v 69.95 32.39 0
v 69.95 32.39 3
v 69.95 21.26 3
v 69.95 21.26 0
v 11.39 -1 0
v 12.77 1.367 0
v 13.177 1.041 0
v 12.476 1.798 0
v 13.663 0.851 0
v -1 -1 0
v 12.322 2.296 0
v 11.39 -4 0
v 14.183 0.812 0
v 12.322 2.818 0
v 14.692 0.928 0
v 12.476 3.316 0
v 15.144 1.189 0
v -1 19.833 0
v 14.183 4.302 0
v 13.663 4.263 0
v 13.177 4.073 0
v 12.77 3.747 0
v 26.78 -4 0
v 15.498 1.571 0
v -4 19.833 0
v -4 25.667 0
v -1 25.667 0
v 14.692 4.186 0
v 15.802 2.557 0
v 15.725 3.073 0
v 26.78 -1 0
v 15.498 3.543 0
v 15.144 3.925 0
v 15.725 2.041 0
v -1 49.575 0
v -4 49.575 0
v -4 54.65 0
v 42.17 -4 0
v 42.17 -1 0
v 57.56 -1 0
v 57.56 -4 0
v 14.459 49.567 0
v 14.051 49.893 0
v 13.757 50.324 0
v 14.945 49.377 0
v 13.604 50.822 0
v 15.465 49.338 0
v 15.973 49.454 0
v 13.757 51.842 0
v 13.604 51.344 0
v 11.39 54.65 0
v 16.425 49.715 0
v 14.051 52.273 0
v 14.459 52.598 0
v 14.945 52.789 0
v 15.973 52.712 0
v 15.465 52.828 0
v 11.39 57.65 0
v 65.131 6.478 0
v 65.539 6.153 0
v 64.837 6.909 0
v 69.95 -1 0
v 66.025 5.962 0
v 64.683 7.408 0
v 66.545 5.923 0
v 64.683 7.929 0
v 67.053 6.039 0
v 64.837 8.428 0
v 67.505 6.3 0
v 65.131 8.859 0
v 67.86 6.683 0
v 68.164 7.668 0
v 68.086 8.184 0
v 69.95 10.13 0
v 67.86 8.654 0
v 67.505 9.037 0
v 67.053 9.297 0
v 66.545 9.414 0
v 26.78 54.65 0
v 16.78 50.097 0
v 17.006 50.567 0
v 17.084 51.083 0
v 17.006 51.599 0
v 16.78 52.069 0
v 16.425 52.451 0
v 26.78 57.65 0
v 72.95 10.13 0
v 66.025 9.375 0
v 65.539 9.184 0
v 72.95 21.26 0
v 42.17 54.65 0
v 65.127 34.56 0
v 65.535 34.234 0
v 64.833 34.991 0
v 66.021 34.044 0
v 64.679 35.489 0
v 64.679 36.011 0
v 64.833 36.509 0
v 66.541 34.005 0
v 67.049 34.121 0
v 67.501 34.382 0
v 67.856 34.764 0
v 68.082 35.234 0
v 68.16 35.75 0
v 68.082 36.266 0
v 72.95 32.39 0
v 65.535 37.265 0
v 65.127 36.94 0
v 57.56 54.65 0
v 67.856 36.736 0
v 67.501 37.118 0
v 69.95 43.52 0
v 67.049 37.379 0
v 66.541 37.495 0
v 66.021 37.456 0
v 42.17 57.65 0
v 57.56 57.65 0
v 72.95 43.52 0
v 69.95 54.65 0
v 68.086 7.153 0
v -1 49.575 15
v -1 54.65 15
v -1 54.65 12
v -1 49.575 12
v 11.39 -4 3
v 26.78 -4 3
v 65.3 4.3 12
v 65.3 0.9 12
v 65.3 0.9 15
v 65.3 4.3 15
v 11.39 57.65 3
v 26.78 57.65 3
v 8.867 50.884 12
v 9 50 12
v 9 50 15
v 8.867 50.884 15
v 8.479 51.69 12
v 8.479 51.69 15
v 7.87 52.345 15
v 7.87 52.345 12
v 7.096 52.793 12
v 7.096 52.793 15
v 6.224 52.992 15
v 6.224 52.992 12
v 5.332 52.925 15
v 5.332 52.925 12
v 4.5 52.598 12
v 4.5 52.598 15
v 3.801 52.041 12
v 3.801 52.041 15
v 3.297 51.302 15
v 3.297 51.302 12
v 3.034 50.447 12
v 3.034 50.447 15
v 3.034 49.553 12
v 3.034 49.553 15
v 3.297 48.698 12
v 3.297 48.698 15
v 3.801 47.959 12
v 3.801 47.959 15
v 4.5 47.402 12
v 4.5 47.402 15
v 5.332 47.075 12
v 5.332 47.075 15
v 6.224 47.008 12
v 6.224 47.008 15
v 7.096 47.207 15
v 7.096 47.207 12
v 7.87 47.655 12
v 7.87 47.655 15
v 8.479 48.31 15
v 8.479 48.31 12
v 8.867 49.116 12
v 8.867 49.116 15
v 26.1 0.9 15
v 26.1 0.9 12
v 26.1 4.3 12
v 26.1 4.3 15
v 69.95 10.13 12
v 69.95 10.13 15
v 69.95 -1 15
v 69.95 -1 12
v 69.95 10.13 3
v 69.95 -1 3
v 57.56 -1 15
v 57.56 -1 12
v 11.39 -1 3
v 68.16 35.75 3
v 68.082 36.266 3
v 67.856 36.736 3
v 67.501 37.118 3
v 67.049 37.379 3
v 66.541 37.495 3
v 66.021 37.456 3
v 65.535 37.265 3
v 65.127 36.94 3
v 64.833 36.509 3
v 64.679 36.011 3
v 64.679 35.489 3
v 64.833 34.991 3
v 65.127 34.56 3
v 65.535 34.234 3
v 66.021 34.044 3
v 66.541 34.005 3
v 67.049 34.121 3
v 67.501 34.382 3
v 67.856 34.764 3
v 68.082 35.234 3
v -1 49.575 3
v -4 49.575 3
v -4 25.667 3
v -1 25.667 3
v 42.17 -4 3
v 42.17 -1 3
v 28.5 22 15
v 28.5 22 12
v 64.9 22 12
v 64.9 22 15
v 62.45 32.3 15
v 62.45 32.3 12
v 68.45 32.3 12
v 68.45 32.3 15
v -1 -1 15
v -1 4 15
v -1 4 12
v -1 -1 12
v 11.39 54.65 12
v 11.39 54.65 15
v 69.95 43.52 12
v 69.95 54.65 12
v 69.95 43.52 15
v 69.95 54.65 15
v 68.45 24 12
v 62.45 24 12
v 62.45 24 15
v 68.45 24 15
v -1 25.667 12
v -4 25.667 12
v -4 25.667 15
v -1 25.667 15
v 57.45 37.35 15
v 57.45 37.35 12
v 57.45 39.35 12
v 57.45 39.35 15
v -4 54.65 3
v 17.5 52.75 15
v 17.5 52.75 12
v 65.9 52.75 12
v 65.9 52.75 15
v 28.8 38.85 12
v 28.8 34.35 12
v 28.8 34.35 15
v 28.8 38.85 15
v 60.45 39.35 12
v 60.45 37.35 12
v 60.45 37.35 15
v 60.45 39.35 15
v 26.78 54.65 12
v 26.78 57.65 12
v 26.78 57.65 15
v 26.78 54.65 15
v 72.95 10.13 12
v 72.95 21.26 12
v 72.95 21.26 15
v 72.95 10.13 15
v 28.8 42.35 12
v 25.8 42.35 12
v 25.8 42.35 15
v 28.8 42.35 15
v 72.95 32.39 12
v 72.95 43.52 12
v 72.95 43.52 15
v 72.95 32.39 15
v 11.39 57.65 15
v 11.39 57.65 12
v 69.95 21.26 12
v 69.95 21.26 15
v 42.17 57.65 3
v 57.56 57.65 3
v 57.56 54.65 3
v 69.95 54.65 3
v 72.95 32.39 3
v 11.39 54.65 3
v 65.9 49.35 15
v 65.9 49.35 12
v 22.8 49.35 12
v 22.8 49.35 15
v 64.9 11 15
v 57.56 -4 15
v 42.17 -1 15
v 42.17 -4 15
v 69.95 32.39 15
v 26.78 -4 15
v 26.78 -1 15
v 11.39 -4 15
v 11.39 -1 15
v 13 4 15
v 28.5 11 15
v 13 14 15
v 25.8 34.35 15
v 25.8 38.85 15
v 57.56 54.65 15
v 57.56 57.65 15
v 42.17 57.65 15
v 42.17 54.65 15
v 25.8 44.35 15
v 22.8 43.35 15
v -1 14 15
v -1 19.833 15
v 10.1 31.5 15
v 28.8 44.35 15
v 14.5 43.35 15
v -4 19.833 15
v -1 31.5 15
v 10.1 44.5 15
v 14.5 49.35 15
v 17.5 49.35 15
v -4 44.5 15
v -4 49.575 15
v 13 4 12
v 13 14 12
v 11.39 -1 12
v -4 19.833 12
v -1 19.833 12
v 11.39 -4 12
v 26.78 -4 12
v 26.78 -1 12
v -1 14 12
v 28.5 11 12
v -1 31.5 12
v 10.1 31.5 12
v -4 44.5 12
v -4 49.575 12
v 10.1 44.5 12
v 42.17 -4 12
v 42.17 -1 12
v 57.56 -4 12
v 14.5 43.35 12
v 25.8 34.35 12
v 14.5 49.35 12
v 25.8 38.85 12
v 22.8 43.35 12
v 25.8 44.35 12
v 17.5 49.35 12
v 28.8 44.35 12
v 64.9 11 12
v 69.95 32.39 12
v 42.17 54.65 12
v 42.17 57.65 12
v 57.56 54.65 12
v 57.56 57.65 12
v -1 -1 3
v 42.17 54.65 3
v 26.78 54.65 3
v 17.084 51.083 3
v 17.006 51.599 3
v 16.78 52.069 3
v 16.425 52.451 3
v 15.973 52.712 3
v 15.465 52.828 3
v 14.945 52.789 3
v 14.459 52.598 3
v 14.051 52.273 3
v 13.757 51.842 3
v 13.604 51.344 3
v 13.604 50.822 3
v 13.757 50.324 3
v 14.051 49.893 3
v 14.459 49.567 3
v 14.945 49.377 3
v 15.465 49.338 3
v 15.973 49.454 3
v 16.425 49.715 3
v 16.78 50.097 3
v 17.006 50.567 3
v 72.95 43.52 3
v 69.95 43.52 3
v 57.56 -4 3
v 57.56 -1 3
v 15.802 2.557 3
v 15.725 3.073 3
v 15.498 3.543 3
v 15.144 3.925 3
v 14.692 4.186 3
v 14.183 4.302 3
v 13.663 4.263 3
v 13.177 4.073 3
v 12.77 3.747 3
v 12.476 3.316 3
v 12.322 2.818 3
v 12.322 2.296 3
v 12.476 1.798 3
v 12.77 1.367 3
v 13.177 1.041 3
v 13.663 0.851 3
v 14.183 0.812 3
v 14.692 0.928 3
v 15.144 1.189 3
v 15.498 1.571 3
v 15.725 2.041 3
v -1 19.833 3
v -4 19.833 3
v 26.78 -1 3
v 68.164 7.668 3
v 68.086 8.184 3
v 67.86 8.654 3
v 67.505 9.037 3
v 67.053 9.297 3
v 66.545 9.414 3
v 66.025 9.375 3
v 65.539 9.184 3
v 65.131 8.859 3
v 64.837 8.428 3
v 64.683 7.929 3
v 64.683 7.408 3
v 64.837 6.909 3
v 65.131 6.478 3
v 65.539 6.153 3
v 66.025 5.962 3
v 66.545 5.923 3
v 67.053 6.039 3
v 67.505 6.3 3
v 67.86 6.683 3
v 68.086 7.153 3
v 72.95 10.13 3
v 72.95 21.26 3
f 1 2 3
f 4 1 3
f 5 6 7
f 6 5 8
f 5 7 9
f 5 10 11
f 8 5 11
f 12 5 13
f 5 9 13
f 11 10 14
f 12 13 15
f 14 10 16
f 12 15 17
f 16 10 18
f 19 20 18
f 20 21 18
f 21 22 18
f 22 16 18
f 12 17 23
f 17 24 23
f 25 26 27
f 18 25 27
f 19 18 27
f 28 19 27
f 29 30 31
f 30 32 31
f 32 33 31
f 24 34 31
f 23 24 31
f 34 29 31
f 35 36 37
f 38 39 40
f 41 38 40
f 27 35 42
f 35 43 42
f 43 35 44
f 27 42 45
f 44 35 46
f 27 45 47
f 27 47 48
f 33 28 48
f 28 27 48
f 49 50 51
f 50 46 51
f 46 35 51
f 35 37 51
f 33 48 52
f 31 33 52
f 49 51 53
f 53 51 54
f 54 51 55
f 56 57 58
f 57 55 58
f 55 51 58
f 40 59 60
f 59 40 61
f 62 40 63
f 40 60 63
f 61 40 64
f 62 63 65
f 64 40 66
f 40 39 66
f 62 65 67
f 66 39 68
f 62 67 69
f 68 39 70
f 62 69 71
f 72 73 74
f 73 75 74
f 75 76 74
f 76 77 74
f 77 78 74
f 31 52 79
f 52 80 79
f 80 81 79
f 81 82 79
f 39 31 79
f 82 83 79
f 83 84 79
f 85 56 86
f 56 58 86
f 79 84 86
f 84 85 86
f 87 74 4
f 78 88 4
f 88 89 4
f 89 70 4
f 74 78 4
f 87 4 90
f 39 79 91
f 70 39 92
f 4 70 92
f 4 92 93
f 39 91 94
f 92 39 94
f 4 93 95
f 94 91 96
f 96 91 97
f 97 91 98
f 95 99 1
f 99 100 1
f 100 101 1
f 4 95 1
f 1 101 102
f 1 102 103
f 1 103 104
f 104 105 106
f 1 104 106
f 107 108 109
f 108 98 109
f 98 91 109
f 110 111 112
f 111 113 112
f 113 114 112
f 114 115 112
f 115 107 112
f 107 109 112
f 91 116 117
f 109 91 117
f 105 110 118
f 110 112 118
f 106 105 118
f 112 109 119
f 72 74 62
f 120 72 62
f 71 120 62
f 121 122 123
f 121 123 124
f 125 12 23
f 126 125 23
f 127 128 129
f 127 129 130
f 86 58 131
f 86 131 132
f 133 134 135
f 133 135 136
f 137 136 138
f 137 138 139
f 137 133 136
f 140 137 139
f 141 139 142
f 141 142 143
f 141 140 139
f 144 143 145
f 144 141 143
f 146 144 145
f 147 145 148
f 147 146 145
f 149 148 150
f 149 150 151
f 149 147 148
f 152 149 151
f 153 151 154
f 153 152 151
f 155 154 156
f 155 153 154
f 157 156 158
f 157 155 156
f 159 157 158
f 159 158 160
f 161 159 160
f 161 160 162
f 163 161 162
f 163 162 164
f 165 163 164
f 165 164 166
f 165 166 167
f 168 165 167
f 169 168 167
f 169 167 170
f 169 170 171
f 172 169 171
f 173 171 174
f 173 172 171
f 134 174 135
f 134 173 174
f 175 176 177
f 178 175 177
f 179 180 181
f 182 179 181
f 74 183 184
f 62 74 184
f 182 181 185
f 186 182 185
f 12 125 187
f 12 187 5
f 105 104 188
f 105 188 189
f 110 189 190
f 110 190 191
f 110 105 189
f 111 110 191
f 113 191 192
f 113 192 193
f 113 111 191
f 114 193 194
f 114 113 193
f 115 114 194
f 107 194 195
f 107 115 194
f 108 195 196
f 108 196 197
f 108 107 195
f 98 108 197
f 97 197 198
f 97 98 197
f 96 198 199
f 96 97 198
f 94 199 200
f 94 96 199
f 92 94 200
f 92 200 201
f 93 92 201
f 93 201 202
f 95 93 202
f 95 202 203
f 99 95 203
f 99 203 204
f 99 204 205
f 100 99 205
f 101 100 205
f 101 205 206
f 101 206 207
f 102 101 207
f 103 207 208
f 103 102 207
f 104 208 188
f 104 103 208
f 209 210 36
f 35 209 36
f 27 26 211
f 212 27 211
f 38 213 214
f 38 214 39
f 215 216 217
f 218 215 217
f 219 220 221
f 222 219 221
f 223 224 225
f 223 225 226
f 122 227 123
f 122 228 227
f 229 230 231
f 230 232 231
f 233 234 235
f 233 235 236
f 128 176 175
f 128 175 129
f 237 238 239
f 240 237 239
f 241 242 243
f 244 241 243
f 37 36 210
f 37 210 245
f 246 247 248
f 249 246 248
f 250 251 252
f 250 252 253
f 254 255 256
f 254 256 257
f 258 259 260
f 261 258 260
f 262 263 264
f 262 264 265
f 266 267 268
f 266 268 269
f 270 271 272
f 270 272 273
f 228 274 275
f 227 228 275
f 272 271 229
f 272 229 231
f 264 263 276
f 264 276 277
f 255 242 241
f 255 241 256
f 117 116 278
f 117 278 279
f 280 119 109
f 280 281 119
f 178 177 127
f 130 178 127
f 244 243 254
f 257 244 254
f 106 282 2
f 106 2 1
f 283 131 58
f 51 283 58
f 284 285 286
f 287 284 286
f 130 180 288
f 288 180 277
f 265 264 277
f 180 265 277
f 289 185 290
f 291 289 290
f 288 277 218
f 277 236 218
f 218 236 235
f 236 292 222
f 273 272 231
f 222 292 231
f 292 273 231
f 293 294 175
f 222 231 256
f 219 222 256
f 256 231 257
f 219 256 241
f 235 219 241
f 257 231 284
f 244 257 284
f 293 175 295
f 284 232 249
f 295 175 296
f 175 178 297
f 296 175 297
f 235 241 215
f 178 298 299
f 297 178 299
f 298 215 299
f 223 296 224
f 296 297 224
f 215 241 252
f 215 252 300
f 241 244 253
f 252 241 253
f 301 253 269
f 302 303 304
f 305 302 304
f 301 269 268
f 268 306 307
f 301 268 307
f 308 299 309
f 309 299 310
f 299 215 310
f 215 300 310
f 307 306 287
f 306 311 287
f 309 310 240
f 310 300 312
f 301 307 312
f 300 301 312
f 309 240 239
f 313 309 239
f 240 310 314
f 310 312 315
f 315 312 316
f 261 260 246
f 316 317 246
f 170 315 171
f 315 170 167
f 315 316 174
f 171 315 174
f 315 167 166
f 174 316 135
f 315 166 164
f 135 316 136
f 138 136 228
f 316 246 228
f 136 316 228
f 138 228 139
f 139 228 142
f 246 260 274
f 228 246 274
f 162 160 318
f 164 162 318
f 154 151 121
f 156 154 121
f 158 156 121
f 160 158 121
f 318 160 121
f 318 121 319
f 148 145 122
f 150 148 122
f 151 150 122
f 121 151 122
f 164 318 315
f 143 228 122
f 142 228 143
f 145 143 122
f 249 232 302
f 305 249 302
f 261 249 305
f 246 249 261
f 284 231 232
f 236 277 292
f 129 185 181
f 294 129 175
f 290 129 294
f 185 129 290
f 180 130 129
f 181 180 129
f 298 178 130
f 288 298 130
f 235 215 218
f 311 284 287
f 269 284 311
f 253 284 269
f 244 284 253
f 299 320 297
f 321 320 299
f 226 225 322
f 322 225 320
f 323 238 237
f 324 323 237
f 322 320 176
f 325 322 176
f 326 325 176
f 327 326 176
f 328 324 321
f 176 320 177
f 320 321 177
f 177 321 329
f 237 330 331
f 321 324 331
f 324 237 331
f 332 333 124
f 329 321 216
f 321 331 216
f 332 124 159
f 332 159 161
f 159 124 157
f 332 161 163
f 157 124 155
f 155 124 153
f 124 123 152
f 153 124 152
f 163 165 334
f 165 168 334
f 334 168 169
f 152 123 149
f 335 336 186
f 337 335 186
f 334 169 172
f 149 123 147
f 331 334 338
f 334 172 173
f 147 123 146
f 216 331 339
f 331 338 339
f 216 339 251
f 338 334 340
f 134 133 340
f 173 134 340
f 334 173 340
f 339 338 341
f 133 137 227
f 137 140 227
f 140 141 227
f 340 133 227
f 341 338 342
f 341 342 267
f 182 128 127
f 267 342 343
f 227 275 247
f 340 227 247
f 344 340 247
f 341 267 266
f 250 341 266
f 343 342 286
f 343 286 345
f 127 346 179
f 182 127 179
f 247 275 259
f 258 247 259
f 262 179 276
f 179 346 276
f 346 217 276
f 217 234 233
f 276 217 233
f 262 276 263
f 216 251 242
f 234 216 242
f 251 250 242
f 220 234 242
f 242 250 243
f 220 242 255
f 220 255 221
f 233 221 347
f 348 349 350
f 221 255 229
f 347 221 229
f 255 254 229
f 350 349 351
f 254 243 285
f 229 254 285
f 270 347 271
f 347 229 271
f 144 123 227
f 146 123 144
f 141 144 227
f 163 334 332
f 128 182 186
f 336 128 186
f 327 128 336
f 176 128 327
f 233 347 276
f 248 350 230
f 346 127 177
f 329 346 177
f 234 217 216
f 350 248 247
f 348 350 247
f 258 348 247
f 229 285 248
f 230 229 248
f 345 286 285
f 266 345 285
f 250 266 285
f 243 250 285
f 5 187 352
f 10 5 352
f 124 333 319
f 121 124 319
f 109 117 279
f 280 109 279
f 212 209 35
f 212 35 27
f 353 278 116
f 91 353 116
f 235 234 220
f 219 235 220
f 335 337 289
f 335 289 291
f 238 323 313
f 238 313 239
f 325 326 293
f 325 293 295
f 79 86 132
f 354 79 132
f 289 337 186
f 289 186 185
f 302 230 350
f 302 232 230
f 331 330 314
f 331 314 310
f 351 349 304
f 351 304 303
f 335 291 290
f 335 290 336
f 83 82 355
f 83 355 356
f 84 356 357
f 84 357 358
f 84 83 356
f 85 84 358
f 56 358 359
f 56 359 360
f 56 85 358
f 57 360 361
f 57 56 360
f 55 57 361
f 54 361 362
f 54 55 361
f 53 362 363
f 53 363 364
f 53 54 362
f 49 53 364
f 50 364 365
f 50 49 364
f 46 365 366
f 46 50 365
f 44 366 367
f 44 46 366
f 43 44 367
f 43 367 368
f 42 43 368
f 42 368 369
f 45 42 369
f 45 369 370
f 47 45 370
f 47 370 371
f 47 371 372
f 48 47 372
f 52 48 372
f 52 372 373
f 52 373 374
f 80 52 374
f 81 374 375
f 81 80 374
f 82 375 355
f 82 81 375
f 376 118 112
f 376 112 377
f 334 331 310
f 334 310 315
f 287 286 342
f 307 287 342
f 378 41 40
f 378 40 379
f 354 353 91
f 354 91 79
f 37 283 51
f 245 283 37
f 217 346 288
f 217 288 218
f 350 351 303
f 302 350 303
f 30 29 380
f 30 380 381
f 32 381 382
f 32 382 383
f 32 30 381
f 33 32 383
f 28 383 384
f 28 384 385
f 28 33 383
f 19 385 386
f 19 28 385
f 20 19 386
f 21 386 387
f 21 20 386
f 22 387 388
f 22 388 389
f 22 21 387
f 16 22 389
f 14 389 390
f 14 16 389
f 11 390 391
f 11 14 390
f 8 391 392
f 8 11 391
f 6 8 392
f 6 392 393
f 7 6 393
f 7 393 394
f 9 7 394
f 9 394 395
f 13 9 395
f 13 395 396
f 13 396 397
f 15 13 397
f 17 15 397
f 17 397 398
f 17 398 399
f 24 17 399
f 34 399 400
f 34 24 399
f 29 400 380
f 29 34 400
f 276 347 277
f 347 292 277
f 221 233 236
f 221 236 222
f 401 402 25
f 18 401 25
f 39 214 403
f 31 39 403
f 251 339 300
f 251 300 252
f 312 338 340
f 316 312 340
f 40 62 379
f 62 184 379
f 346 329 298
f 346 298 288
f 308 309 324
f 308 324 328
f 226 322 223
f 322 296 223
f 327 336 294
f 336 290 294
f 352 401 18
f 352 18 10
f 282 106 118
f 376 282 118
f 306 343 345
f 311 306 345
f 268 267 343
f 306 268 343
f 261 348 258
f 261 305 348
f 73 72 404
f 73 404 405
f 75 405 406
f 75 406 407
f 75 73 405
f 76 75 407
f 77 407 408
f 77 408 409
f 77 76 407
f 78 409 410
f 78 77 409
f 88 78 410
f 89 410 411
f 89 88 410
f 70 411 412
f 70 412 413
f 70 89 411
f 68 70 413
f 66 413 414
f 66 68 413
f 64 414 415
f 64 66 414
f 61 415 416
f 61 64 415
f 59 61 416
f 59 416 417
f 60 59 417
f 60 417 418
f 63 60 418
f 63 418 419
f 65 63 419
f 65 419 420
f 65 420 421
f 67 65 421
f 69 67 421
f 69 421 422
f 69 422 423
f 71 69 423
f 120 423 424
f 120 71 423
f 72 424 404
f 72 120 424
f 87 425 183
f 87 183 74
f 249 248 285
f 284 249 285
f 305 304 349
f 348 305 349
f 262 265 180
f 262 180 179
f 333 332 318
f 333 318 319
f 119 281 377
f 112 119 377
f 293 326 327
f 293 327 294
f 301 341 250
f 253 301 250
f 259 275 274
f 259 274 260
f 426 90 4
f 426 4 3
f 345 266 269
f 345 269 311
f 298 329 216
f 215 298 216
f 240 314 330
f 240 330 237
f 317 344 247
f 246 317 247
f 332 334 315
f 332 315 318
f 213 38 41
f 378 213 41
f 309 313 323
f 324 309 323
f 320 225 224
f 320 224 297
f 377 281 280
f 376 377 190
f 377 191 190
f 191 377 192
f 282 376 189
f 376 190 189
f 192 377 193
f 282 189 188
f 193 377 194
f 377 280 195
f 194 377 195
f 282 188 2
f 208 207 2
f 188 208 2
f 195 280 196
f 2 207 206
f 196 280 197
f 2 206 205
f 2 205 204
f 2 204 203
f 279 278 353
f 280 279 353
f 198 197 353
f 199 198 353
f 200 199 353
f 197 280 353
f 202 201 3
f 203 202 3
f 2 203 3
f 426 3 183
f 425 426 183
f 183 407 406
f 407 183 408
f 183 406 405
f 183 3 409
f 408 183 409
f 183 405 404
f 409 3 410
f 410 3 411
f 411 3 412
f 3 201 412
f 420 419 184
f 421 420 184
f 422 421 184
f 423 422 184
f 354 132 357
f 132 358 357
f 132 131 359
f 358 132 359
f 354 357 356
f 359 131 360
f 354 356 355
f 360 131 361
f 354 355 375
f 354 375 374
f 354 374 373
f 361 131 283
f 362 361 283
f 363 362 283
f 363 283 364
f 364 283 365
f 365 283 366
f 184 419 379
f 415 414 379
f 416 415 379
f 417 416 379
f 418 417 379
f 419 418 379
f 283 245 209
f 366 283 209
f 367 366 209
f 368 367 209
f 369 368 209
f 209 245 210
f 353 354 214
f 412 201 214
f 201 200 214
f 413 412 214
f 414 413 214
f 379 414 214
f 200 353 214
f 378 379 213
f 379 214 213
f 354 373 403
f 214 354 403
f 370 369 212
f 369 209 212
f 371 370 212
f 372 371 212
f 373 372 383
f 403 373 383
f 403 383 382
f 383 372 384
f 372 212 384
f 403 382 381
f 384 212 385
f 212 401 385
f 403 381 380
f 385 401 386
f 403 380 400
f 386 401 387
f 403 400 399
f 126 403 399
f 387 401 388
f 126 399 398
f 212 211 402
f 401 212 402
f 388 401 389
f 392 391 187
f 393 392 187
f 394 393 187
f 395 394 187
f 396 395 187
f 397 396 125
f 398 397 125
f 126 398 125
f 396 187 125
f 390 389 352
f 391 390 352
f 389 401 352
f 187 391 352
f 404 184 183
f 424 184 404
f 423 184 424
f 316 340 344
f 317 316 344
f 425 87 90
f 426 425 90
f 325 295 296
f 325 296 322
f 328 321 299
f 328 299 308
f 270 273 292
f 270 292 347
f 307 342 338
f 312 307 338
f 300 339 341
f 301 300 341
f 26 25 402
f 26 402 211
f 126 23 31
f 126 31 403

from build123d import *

# Parameters (mm, degrees)
EXTRUDE004_DEPTH = 3
EXTRUDE003_DEPTH = 3
EXTRUDE002_DEPTH = 3
SKETCH001_R      = 3
SKETCH001_W      = 3
SKETCH001_H      = 2
SKETCH001_W_2    = 36.4
SKETCH001_H_2    = 11
SKETCH001_W_3    = 6
SKETCH001_H_3    = 8.3
SKETCH001_W_4    = 39.2
SKETCH001_H_4    = 3.4
SKETCH001_H_5    = 4.5
EXTRUDE001_DEPTH = 3
SKETCH_W         = 76.95
SKETCH_H         = 61.65
SKETCH_R         = 1.75
EXTRUDE_DEPTH    = 3


with BuildPart() as extrude004:
    # Sketch004 (on Face10 of Cut005) → Extrude004 (new body)
    with BuildSketch(Plane.YZ.offset(72.95)):
        Polygon((-1, 15), (10.13, 15), (10.13, 12), (21.26, 12), (21.26, 15), (32.39, 15), (32.39, 12), (43.52, 12), (43.52, 15), (54.65, 15), (54.65, 12), (57.65, 12), (57.65, 3), (54.65, 3), (54.65, 0), (43.52, 0), (43.52, 3), (32.39, 3), (32.39, 0), (21.26, 0), (21.26, 3), (10.13, 3), (10.13, 0), (-1, 0), (-1, 3), (-4, 3), (-4, 12), (-1, 12), align=None)
    extrude(amount=-EXTRUDE004_DEPTH)


with BuildPart() as frontal:
    # Sketch003 (on Face20 of Cut003) → Extrude003 (new body)
    with BuildSketch(Plane(origin=(-4, 0, 0), x_dir=(0, -1, 0), z_dir=(-1, 0, 0))):
        Polygon((-54.65, 15), (-54.65, 12), (-57.65, 12), (-57.65, 3), (-49.575, 3), (-49.575, 0), (-25.666667, 0), (-25.666667, 3), (-19.833333, 3), (-19.833333, 0), (1, 0), (1, 3), (4, 3), (4, 12), (1, 12), (1, 15), (-4, 15), (-4, 5), (-14, 5), (-14, 15), (-19.833333, 15), (-19.833333, 12), (-25.666667, 12), (-25.666667, 15), (-31.5, 15), (-31.5, 5), (-44.5, 5), (-44.5, 12), (-49.575, 12), (-49.575, 15), align=None)
    extrude(amount=-EXTRUDE003_DEPTH)


with BuildPart() as face_longitudinal:
    # Sketch002 (on Face3 of Extrude) → Extrude002 (new body)
    with BuildSketch(Plane.XZ.offset(4)):
        Polygon((-4, 15), (11.39, 15), (11.39, 12), (26.78, 12), (26.78, 15), (42.17, 15), (42.17, 12), (57.56, 12), (57.56, 15), (72.95, 15), (72.95, 12), (69.95, 12), (69.95, 3), (72.95, 3), (72.95, 0), (57.56, 0), (57.56, 3), (42.17, 3), (42.17, 0), (26.78, 0), (26.78, 3), (11.39, 3), (11.39, 0), (-4, 0), (-4, 3), (-1, 3), (-1, 12), (-4, 12), align=None)
    extrude(amount=-EXTRUDE002_DEPTH)


with BuildPart() as face_longitudinal_mirrored:
    # mirror: instance of Face Longitudinal
    add(face_longitudinal.part.mirror(Plane(origin=(71.95, 26.825, 12.5), x_dir=(1, 0, 0), z_dir=(0, 1, 0))))


with BuildPart() as cut006:
    # Sketch001 → Extrude001 (new body)
    with BuildSketch(Plane.XY):
        Polygon((-4, 57.65), (72.95, 57.65), (72.95, -4), (-4, -4), (-4, 4), (13, 4), (13, 14), (-4, 14), (-4, 31.5), (10.1, 31.5), (10.1, 44.5), (-4, 44.5), align=None)
        with Locations((6, 50)):
            Circle(SKETCH001_R, mode=Mode.SUBTRACT)
        with Locations((27.3, 43.35)):
            Rectangle(SKETCH001_W, SKETCH001_H, mode=Mode.SUBTRACT)
        with Locations((46.7, 16.5)):
            Rectangle(SKETCH001_W_2, SKETCH001_H_2, mode=Mode.SUBTRACT)
        with Locations((65.45, 28.15)):
            Rectangle(SKETCH001_W_3, SKETCH001_H_3, mode=Mode.SUBTRACT)
        with Locations((45.7, 2.6)):
            Rectangle(SKETCH001_W_4, SKETCH001_H_4, mode=Mode.SUBTRACT)
        Polygon((22.8, 43.35), (14.5, 43.35), (14.5, 49.35), (17.5, 49.35), (17.5, 52.75), (65.9, 52.75), (65.9, 49.35), (22.8, 49.35), align=None, mode=Mode.SUBTRACT)
        with Locations((27.3, 36.6)):
            Rectangle(SKETCH001_W, SKETCH001_H_5, mode=Mode.SUBTRACT)
        with Locations((58.95, 38.35)):
            Rectangle(SKETCH001_W, SKETCH001_H, mode=Mode.SUBTRACT)
    extrude(amount=EXTRUDE001_DEPTH)


with BuildPart() as cut006_1:
    # Extrude001 placement: moved
    add(cut006.part.moved(Location((0, 0, 12))))

    # Cut: cut Face Longitudinal
    add(face_longitudinal.part, mode=Mode.SUBTRACT)

    # Cut001: cut Face Longitudinal (mirrored)
    add(face_longitudinal_mirrored.part, mode=Mode.SUBTRACT)

    # Cut004: cut Frontal
    add(frontal.part, mode=Mode.SUBTRACT)

    # Cut006: cut Extrude004
    add(extrude004.part, mode=Mode.SUBTRACT)


with BuildPart() as cut007:
    # Sketch → Extrude (new body)
    with BuildSketch(Plane.XY):
        with Locations((34.475, 26.825)):
            Rectangle(SKETCH_W, SKETCH_H)
        with Locations((15.334135, 51.082933)):
            Circle(SKETCH_R, mode=Mode.SUBTRACT)
        with Locations((66.409951, 35.749834)):
            Circle(SKETCH_R, mode=Mode.SUBTRACT)
        with Locations((66.413926, 7.668398)):
            Circle(SKETCH_R, mode=Mode.SUBTRACT)
        with Locations((14.05247, 2.556984)):
            Circle(SKETCH_R, mode=Mode.SUBTRACT)
    extrude(amount=EXTRUDE_DEPTH)

    # Cut002: cut Face Longitudinal
    add(face_longitudinal.part, mode=Mode.SUBTRACT)

    # Cut003: cut Face Longitudinal (mirrored)
    add(face_longitudinal_mirrored.part, mode=Mode.SUBTRACT)

    # Cut005: cut Frontal
    add(frontal.part, mode=Mode.SUBTRACT)

    # Cut007: cut Extrude004
    add(extrude004.part, mode=Mode.SUBTRACT)


solid = Compound([cut006_1.part, cut007.part])
